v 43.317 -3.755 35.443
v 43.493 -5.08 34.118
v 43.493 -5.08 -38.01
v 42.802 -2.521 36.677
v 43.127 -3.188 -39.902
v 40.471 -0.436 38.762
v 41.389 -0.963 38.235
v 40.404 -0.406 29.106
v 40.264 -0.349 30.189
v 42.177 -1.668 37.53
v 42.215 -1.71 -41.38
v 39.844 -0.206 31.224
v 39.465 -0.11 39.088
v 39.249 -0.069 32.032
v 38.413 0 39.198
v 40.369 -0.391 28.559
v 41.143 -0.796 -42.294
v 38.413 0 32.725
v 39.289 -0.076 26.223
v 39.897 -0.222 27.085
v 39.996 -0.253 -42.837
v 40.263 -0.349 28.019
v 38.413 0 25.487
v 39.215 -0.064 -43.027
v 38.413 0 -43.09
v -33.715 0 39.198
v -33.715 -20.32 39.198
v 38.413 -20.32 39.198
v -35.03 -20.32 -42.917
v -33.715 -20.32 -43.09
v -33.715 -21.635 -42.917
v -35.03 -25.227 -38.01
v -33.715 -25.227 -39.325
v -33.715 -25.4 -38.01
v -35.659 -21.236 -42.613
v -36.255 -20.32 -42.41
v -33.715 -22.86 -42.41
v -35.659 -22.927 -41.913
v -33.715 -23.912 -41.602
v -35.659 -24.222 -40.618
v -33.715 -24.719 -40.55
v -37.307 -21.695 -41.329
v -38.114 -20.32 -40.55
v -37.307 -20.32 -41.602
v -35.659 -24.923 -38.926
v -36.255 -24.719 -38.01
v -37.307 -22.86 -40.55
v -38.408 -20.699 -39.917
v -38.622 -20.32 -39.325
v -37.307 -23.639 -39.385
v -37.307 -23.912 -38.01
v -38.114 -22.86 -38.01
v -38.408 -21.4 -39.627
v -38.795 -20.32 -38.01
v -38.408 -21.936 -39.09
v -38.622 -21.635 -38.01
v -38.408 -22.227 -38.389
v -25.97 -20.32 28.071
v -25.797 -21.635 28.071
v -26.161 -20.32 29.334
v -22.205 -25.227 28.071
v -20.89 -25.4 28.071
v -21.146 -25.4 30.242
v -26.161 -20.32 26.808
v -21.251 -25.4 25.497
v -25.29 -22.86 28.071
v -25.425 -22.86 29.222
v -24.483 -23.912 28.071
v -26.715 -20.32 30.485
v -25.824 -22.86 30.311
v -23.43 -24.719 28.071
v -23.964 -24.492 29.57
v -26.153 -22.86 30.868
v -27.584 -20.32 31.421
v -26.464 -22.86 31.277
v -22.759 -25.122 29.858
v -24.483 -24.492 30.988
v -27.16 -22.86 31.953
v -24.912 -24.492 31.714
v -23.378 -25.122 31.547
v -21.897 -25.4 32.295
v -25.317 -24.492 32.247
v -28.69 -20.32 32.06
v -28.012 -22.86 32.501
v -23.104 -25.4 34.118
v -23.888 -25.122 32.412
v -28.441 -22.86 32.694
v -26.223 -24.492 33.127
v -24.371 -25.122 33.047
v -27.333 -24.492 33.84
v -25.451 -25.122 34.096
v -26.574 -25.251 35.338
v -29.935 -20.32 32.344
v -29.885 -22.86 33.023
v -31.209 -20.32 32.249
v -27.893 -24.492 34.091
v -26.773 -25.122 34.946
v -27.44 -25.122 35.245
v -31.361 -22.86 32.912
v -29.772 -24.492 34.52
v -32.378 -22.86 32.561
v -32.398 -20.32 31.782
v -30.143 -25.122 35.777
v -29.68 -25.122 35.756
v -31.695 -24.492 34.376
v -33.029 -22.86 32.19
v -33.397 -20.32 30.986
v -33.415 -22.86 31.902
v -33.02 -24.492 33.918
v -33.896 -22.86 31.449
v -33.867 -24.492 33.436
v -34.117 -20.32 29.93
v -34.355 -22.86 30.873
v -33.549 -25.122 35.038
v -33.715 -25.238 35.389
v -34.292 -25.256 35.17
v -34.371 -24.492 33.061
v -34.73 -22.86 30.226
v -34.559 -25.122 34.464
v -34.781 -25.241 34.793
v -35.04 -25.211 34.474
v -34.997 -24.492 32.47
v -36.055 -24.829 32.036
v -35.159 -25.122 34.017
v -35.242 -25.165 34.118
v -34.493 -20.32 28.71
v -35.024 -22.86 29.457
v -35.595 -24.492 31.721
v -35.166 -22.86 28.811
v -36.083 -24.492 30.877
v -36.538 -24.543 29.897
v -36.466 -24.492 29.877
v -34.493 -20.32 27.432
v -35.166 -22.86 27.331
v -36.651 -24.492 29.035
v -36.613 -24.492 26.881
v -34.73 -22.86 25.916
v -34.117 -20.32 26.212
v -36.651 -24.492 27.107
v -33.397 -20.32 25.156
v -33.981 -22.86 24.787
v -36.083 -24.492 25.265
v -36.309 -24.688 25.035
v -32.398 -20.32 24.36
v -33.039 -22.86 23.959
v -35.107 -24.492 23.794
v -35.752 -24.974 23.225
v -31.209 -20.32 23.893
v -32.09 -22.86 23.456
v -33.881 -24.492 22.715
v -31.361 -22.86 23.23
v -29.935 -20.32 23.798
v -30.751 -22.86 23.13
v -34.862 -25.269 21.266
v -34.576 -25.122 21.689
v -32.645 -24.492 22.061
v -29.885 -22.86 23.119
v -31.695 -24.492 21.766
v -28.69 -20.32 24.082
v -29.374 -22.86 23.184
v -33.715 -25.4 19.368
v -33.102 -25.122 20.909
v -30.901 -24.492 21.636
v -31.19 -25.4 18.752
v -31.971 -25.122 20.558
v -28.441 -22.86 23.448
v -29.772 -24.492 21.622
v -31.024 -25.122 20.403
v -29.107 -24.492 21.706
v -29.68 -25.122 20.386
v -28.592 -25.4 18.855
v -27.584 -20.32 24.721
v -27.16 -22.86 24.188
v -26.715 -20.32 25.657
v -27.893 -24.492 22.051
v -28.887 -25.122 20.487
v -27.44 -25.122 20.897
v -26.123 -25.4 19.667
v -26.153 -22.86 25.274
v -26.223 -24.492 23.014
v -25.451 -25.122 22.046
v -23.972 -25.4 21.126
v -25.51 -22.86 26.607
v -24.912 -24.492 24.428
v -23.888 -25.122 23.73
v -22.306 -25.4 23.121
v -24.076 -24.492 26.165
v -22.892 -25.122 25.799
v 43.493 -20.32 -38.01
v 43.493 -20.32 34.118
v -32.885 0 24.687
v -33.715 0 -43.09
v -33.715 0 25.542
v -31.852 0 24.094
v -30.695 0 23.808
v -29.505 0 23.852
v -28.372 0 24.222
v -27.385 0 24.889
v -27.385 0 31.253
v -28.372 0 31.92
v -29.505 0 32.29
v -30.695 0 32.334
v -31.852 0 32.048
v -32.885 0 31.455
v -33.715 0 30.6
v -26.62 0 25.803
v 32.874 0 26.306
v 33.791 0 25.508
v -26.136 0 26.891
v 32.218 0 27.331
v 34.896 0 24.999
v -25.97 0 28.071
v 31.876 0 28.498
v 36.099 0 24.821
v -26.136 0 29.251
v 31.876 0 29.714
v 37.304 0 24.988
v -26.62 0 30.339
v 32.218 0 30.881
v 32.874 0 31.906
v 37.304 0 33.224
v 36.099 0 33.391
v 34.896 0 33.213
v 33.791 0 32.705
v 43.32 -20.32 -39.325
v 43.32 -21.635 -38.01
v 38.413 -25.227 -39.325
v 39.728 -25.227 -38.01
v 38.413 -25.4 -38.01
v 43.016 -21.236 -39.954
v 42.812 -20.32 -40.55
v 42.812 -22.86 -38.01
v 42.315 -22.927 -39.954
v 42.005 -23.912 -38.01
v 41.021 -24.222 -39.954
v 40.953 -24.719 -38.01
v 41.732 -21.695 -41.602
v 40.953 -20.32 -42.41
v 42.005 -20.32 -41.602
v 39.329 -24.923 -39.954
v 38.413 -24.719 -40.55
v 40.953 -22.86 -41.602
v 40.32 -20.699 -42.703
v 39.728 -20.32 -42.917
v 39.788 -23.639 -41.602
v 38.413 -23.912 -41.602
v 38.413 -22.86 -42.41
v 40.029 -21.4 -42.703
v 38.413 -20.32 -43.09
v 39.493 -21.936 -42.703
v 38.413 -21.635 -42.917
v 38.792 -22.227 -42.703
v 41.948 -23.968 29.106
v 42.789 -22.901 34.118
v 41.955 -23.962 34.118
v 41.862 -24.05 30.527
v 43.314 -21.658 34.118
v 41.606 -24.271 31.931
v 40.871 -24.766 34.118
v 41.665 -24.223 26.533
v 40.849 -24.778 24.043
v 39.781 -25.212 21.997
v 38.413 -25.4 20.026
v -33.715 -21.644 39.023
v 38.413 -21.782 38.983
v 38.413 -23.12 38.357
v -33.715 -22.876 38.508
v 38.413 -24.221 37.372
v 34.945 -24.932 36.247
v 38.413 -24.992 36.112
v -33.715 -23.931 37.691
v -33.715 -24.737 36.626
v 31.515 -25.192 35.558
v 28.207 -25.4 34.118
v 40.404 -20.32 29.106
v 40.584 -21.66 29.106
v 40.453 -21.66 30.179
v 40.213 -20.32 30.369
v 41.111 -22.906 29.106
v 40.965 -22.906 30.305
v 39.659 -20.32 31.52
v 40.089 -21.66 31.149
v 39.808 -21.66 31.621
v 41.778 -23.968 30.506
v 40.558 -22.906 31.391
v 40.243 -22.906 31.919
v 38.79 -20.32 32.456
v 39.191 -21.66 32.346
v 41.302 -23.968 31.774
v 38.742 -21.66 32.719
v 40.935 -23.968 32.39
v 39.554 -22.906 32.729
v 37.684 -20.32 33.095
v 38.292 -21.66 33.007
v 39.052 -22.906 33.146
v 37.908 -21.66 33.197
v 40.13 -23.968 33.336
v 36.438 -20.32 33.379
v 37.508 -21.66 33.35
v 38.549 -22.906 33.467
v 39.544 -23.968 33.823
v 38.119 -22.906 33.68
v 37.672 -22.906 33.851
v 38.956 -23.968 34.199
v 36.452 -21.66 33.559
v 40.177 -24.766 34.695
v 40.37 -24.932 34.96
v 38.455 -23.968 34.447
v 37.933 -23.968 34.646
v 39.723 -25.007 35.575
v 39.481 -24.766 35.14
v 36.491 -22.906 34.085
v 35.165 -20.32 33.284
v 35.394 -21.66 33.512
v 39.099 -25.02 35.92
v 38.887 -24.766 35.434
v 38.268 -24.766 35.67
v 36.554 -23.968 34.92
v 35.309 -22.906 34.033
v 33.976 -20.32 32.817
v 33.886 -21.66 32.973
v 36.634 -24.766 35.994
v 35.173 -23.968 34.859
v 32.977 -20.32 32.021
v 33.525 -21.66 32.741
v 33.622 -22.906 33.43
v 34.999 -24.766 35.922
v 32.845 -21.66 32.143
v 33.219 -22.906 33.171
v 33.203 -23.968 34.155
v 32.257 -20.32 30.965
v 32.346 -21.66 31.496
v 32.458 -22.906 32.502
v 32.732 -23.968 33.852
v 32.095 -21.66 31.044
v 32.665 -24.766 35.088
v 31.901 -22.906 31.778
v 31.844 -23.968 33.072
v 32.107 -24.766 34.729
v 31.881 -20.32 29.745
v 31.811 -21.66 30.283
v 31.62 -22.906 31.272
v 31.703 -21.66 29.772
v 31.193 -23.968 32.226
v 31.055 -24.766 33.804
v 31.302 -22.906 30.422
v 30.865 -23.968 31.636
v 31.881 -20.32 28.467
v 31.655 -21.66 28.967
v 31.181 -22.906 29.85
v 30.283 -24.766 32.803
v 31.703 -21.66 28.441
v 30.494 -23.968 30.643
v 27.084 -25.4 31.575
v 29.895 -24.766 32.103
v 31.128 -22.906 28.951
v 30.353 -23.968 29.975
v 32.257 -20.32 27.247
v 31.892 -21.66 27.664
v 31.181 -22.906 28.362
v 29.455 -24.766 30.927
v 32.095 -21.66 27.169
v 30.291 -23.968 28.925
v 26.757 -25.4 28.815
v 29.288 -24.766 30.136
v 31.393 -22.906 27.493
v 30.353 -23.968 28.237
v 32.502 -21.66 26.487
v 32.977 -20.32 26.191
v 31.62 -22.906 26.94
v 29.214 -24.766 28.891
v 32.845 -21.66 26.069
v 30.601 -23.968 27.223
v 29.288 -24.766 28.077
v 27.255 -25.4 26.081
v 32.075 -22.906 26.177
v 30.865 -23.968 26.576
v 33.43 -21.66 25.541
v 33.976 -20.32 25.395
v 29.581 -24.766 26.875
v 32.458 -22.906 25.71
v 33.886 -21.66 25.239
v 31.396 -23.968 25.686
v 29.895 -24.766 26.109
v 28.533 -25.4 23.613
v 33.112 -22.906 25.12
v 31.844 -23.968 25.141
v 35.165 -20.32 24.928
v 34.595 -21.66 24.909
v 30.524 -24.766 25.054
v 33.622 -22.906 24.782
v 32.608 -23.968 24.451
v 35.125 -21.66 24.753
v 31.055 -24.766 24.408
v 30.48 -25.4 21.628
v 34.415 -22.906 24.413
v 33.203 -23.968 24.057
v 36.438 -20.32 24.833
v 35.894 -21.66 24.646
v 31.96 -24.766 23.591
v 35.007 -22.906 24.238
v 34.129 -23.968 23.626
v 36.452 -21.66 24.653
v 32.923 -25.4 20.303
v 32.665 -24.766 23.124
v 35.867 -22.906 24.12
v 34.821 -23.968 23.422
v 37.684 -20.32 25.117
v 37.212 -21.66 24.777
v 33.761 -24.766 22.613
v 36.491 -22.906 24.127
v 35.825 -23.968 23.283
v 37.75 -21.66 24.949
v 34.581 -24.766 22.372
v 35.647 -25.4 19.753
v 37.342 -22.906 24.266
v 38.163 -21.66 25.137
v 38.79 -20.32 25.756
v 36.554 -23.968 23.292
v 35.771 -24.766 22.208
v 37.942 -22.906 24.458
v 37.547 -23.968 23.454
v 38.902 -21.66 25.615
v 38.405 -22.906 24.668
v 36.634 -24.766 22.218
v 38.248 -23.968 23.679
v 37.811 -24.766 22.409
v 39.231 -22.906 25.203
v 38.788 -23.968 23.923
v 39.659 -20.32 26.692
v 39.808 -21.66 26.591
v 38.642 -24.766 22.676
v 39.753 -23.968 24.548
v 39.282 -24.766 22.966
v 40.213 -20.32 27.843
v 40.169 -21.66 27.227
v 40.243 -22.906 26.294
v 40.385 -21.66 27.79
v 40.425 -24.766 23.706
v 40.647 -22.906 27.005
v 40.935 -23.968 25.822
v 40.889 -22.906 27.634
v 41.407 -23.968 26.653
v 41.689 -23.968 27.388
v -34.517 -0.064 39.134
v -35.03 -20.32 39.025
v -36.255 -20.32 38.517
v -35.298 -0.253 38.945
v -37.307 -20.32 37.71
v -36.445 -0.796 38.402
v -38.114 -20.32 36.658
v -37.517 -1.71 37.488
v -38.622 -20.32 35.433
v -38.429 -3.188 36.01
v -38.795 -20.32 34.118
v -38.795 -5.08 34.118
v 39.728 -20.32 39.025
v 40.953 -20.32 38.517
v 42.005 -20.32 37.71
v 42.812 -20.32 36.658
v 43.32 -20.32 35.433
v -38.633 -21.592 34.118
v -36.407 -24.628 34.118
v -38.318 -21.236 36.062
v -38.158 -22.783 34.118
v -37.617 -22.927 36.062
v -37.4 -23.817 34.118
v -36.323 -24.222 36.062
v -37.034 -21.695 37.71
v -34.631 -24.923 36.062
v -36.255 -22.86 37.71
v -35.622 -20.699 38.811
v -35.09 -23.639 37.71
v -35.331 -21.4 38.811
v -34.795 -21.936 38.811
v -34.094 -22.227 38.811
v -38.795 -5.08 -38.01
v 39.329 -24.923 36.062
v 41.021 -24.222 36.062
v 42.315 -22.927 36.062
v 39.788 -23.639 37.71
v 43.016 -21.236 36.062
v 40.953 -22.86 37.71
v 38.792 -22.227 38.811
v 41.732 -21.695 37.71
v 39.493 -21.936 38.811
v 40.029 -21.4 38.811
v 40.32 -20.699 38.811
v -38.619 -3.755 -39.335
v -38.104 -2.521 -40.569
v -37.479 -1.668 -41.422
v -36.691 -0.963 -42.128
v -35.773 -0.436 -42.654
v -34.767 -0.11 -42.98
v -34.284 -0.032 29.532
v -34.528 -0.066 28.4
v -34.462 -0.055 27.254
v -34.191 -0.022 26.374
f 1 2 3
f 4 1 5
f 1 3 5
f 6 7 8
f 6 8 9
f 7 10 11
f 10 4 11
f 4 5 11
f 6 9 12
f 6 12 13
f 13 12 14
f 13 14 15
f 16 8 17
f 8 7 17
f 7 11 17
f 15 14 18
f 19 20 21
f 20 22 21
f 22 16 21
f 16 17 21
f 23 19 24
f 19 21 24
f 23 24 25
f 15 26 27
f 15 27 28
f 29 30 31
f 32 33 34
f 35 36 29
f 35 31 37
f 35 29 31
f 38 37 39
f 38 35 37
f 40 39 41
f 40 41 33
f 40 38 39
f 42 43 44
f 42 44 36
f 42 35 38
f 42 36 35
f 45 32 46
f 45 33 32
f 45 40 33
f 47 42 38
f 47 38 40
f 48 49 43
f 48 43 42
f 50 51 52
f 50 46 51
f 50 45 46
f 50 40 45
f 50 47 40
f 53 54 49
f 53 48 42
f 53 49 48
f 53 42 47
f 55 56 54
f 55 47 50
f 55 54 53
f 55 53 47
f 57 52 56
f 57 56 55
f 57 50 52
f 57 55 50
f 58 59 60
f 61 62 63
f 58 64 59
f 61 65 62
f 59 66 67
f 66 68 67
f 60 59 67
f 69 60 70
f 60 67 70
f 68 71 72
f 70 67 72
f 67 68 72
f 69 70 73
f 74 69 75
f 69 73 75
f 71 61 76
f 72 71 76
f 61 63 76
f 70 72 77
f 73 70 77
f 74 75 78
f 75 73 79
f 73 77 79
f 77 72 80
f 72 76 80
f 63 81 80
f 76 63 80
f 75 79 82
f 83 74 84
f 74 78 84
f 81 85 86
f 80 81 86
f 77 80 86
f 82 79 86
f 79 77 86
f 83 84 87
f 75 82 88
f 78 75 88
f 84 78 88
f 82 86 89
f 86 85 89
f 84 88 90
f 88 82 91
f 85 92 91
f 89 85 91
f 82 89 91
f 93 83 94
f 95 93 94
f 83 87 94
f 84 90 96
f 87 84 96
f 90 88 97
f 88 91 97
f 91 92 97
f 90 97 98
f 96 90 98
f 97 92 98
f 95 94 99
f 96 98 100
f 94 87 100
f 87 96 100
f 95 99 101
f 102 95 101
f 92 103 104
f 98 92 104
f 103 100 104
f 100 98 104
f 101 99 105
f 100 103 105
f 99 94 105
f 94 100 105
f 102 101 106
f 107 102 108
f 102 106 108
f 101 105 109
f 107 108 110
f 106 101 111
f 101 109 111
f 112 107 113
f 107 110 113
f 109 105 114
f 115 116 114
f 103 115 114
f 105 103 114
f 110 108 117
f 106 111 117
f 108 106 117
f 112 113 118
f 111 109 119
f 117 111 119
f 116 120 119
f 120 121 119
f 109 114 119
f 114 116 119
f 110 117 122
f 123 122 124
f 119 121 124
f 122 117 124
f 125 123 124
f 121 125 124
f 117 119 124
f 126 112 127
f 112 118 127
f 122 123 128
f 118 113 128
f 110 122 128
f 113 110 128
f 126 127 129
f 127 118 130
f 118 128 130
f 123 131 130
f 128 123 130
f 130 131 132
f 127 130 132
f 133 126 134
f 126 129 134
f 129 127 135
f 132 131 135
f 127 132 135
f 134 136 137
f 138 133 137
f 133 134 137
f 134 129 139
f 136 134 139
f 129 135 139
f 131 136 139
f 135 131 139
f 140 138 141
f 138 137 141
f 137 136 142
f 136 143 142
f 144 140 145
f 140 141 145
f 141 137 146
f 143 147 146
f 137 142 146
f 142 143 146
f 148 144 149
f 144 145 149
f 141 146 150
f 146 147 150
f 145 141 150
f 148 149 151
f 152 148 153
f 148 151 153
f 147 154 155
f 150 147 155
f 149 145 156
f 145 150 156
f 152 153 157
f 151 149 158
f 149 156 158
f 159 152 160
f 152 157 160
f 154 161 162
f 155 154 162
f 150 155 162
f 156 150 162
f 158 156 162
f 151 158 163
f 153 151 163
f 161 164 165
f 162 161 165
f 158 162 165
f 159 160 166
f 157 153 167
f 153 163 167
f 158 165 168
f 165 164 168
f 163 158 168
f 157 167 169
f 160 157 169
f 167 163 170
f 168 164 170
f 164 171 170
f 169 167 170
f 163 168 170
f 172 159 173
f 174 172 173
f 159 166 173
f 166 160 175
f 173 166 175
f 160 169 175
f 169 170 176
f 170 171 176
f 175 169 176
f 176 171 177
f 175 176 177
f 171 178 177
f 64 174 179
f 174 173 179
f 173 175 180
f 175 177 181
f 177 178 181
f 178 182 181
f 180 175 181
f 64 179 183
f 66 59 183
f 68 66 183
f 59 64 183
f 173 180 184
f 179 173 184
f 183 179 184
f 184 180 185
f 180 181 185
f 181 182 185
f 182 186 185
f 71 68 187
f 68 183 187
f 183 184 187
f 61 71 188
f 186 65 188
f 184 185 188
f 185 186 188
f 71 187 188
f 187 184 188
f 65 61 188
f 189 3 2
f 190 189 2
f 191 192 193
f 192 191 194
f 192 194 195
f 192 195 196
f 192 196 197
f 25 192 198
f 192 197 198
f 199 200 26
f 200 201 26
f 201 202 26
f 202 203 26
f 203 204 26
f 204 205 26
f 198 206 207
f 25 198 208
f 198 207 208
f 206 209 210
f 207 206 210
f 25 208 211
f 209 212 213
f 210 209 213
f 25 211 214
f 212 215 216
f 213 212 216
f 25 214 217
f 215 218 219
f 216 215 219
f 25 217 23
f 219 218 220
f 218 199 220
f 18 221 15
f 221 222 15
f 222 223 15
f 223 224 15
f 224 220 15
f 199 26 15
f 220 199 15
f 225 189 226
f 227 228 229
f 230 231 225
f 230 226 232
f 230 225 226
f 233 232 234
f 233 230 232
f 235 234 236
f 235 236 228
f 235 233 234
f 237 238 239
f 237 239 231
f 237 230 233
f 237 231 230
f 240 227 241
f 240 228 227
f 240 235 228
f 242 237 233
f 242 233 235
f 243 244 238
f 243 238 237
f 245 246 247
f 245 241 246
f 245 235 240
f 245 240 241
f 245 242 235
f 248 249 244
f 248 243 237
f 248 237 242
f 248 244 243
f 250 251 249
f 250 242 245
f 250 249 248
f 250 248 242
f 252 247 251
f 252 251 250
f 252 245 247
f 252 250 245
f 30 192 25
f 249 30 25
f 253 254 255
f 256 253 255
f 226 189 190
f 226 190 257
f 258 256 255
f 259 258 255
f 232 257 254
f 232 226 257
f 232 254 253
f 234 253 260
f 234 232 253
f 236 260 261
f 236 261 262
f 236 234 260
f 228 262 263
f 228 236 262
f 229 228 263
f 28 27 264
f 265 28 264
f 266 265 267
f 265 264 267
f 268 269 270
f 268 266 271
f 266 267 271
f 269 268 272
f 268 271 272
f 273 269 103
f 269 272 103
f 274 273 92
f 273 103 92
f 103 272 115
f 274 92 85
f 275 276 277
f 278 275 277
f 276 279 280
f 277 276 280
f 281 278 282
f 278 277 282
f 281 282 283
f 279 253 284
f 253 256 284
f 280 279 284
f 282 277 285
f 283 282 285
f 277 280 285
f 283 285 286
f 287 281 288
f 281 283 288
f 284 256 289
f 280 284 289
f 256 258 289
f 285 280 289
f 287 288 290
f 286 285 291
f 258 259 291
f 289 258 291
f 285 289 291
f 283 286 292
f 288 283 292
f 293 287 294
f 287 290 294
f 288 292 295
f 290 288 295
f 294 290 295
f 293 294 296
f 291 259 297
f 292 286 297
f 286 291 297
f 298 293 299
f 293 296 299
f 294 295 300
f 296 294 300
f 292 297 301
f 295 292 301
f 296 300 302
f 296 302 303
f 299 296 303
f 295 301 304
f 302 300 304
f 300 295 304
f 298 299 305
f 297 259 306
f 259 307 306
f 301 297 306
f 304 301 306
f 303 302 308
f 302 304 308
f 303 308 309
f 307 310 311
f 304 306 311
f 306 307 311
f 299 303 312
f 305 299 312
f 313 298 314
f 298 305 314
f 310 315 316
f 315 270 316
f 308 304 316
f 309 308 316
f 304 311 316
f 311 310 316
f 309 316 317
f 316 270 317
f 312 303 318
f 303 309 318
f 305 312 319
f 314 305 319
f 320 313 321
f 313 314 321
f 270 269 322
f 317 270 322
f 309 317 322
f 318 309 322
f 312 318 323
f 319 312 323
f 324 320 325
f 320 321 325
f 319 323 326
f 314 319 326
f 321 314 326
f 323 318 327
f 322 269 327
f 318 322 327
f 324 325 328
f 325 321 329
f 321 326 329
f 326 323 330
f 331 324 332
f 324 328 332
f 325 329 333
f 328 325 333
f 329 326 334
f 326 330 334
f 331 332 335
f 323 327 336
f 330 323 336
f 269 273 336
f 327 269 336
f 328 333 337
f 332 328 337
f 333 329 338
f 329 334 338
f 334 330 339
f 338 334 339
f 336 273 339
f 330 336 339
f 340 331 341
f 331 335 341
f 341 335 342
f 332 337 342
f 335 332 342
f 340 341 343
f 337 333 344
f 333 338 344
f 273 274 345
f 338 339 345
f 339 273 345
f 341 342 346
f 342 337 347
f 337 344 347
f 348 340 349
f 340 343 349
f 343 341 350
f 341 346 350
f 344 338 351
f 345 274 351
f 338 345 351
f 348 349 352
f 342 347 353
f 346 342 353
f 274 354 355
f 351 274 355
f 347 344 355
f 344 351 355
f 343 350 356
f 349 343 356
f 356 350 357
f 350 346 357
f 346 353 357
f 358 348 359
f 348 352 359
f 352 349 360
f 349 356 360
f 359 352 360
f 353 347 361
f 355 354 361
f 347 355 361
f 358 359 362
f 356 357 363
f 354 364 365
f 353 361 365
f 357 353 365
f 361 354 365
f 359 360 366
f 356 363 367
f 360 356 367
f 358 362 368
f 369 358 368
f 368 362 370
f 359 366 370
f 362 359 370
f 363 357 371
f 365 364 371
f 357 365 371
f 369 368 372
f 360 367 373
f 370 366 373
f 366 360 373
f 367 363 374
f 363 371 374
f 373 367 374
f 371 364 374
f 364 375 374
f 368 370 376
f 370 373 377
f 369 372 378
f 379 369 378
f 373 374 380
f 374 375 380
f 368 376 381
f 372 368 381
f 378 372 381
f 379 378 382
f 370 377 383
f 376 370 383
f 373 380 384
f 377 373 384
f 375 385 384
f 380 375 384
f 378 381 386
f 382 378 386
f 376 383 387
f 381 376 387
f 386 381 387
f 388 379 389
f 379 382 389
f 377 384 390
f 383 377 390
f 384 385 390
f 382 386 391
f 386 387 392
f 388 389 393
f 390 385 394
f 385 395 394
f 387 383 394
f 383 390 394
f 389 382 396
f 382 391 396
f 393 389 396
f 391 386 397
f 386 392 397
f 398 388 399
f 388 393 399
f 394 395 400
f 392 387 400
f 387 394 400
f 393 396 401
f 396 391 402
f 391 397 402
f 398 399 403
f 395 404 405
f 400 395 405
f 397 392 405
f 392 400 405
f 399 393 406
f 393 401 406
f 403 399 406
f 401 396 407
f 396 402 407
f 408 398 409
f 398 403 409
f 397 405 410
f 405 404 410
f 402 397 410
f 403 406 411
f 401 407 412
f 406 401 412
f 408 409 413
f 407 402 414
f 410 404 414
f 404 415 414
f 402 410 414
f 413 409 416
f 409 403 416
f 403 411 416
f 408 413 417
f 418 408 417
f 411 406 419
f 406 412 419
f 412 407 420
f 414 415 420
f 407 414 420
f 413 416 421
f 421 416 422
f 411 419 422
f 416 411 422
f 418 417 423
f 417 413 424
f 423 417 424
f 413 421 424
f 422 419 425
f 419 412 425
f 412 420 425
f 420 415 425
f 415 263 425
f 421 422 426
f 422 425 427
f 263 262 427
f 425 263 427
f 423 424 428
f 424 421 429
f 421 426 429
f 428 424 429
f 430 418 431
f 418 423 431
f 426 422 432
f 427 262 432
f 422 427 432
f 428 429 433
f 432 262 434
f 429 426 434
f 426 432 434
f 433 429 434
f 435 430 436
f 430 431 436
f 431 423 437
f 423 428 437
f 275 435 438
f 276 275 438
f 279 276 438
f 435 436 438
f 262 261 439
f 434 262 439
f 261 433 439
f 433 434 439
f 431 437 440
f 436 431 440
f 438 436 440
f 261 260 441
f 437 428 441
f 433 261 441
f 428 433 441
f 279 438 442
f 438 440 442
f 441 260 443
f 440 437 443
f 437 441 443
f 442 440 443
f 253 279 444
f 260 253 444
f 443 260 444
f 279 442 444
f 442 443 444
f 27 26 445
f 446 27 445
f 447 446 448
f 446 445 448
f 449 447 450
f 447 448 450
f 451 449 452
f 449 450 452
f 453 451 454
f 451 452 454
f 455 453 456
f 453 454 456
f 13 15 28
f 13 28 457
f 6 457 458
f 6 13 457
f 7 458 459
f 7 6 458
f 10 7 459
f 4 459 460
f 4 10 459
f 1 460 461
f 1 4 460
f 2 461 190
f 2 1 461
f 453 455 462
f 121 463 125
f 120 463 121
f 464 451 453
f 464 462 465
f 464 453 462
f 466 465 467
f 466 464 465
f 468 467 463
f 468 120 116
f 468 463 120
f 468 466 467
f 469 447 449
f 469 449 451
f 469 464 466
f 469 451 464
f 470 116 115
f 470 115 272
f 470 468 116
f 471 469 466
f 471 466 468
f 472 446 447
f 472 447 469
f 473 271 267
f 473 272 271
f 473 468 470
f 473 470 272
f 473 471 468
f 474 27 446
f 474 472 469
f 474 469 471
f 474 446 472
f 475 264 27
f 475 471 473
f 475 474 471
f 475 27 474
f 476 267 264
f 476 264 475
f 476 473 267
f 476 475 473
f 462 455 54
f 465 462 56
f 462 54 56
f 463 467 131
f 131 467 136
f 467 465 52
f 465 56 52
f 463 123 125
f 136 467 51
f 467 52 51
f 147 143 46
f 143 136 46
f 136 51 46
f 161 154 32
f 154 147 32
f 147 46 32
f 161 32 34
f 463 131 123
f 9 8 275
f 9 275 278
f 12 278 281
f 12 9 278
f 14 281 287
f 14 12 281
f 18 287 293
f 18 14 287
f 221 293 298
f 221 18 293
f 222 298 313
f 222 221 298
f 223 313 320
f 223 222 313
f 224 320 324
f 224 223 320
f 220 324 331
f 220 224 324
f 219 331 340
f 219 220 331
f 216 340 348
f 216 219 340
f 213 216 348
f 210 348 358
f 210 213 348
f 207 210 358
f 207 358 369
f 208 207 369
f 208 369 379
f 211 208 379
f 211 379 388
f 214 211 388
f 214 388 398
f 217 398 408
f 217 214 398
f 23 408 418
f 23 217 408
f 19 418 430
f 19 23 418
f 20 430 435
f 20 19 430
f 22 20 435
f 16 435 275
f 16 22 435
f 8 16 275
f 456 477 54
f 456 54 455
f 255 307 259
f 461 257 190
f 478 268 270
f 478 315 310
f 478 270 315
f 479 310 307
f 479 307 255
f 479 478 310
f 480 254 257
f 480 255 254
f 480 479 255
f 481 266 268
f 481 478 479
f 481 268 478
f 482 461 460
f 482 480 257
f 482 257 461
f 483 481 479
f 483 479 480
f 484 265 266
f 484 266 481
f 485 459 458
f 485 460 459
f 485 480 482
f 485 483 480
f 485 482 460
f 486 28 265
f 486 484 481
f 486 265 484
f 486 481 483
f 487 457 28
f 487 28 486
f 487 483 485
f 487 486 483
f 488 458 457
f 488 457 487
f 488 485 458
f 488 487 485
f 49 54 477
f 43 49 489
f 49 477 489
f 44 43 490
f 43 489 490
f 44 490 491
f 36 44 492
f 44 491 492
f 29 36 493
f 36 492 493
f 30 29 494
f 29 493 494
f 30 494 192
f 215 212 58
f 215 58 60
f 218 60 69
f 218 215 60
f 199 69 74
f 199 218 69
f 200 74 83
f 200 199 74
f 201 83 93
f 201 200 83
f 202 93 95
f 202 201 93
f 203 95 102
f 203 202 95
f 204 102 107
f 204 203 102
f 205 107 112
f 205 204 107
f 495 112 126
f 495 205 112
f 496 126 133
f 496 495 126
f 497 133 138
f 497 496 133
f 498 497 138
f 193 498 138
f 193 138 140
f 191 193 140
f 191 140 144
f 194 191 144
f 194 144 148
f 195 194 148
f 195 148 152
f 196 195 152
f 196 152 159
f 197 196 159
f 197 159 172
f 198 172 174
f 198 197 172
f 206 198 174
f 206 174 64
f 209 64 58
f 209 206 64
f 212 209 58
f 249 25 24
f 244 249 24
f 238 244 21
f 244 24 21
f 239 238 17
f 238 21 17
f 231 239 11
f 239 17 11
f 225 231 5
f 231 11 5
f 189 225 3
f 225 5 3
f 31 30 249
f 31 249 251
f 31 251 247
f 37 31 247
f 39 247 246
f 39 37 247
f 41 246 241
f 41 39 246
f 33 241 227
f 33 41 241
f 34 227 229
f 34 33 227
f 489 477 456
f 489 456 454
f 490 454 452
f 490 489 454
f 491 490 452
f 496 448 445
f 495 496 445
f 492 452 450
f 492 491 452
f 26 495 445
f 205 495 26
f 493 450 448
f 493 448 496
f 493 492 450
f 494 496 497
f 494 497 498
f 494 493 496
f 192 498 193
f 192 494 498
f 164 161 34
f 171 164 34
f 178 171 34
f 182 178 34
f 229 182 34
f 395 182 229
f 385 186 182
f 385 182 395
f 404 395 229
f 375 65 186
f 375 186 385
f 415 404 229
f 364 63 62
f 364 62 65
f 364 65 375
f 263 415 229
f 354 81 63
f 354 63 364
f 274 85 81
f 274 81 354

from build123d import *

# Parameters (mm, degrees)
F0_W         = 82.2881497443
F0_H         = 82.288146019
F0_R         = 4.2853217598
F1_DEPTH     = 25.4
F2_T1_DEPTH  = 33.02
F2_T3_DEPTH  = 107.688146019
F2_T5_DEPTH  = 72.128146019
F2_T7_DEPTH  = 72.1281497443
F2_S11_W     = 5.08
F2_S11_H     = 5.08
F2_T12_DEPTH = 5.08
F2_S17_W     = 5.08
F2_S17_H     = 5.08
F2_T18_DEPTH = 5.08
F2_S23_W     = 5.08
F2_S23_H     = 5.08
F2_T24_DEPTH = 5.08
F2_S29_W     = 5.08
F2_S29_H     = 5.08
F2_T30_DEPTH = 5.08


# Not quite as in the source:
# - a fillet or chamfer that OpenCascade refuses, or shapes differently, is made with other operations: its cross-section is extruded or revolved along the edge and cut away or added
# - a feature of the source that left no trace in its solid (it failed there, or was rolled back) is left out


with BuildPart() as f1:
    # F0 (on Front) → F1 (new body)
    with BuildSketch(Plane.XZ):
        with Locations((2.3490097374, -1.9460879266)):
            Rectangle(F0_W, F0_H)
        with Locations((-30.2557293326, 28.0709732324)):
            Circle(F0_R, mode=Mode.SUBTRACT)
        with Locations((36.1182056367, 29.1060488671)):
            Circle(F0_R, mode=Mode.SUBTRACT)
    extrude(amount=F1_DEPTH)

    # F2: fillet of radius 5.08 on 12 edges, made by hand

    # F2_s2 → F2_t1 (cut)
    with BuildSketch(Plane.XZ.offset(-12.7)):
        with BuildLine():
            ThreePointArc((38.4130846095, -43.0901609361), (42.0051870579, -41.6022633845), (43.4930846095, -38.0101609361))
            Line((43.4930846095, -38.0101609361), (43.4930846095, -43.0901609361))
            Line((43.4930846095, -43.0901609361), (38.4130846095, -43.0901609361))
        make_face()
        with BuildLine():
            ThreePointArc((38.4130846095, 39.1979850829), (42.0051870579, 37.7100875313), (43.4930846095, 34.1179850829))
            Line((43.4930846095, 34.1179850829), (43.4930846095, 39.1979850829))
            Line((43.4930846095, 39.1979850829), (38.4130846095, 39.1979850829))
        make_face()
        with BuildLine():
            ThreePointArc((-33.7150651348, 39.1979850829), (-37.3071675832, 37.7100875313), (-38.7950651348, 34.1179850829))
            Line((-38.7950651348, 34.1179850829), (-38.7950651348, 39.1979850829))
            Line((-38.7950651348, 39.1979850829), (-33.7150651348, 39.1979850829))
        make_face()
        with BuildLine():
            ThreePointArc((-38.7950651348, -38.0101609361), (-37.3071675832, -41.6022633845), (-33.7150651348, -43.0901609361))
            Line((-33.7150651348, -43.0901609361), (-38.7950651348, -43.0901609361))
            Line((-38.7950651348, -43.0901609361), (-38.7950651348, -38.0101609361))
        make_face()
    extrude(amount=F2_T1_DEPTH, mode=Mode.SUBTRACT)

    # F2_s4 → F2_t3 (cut)
    with BuildSketch(Plane.XY.offset(-55.7901609361)):
        with BuildLine():
            ThreePointArc((43.4930846095, -5.08), (42.0051870579, -1.4878975516), (38.4130846095, 0))
            Line((38.4130846095, 0), (43.4930846095, 0))
            Line((43.4930846095, 0), (43.4930846095, -5.08))
        make_face()
        with BuildLine():
            ThreePointArc((-38.7950651348, -5.08), (-37.3071675832, -1.4878975516), (-33.7150651348, 0))
            Line((-33.7150651348, 0), (-38.7950651348, 0))
            Line((-38.7950651348, 0), (-38.7950651348, -5.08))
        make_face()
    extrude(amount=F2_T3_DEPTH, mode=Mode.SUBTRACT)

    # F2_s6 → F2_t5 (cut)
    with BuildSketch(Plane.XY.offset(-38.0101609361)):
        with BuildLine():
            ThreePointArc((43.4930846095, -20.32), (42.0051870579, -23.9121024484), (38.4130846095, -25.4))
            Line((38.4130846095, -25.4), (43.4930846095, -25.4))
            Line((43.4930846095, -25.4), (43.4930846095, -20.32))
        make_face()
        with BuildLine():
            ThreePointArc((-38.7950651348, -20.32), (-37.3071675832, -23.9121024484), (-33.7150651348, -25.4))
            Line((-33.7150651348, -25.4), (-38.7950651348, -25.4))
            Line((-38.7950651348, -25.4), (-38.7950651348, -20.32))
        make_face()
    extrude(amount=F2_T5_DEPTH, mode=Mode.SUBTRACT)

    # F2_s8 → F2_t7 (cut)
    with BuildSketch(Plane.YZ.offset(-33.7150651348)):
        with BuildLine():
            ThreePointArc((-20.32, 39.1979850829), (-23.9121024484, 37.7100875313), (-25.4, 34.1179850829))
            Line((-25.4, 34.1179850829), (-25.4, 39.1979850829))
            Line((-25.4, 39.1979850829), (-20.32, 39.1979850829))
        make_face()
        with BuildLine():
            ThreePointArc((-20.32, -43.0901609361), (-23.9121024484, -41.6022633845), (-25.4, -38.0101609361))
            Line((-25.4, -38.0101609361), (-25.4, -43.0901609361))
            Line((-25.4, -43.0901609361), (-20.32, -43.0901609361))
        make_face()
    extrude(amount=F2_T7_DEPTH, mode=Mode.SUBTRACT)


with BuildPart() as f2_tool10:
    # F2_s11 → F2_t12 (new body)
    with BuildSketch(Plane.XY.offset(-38.0101609361)):
        with Locations((40.9530846095, -22.86)):
            Rectangle(F2_S11_W, F2_S11_H)
    extrude(amount=-F2_T12_DEPTH)

    # F2_s13 → F2_t14 (revolve, cut)
    with BuildSketch(Plane(origin=(38.4130846095, -20.32, -38.0101609361), x_dir=(-0.7071067812, 0.7071067812, 0), z_dir=(-0.7071067812, -0.7071067812, 0))):
        with BuildLine():
            ThreePointArc((0, -5.08), (5.08, 0), (0, 5.08))
            Line((0, 5.08), (0, -5.08))
        make_face()
    revolve(axis=Axis((38.4130846095, -20.32, -38.0101609361), (0, 0, -1)), mode=Mode.SUBTRACT)


with BuildPart() as f1_1:
    add(f1.part)

    # F2_t9: cut F2_tool10
    add(f2_tool10.part, mode=Mode.SUBTRACT)


with BuildPart() as f2_tool16:
    # F2_s17 → F2_t18 (new body)
    with BuildSketch(Plane.XY.offset(34.1179850829)):
        with Locations((40.9530846095, -22.86)):
            Rectangle(F2_S17_W, F2_S17_H)
    extrude(amount=F2_T18_DEPTH)

    # F2_s19 → F2_t20 (revolve, cut)
    with BuildSketch(Plane(origin=(38.4130846095, -20.32, 34.1179850829), x_dir=(-0.7071067812, 0.7071067812, 0), z_dir=(0.7071067812, 0.7071067812, 0))):
        with BuildLine():
            ThreePointArc((0, -5.08), (5.08, 0), (0, 5.08))
            Line((0, 5.08), (0, -5.08))
        make_face()
    revolve(axis=Axis((38.4130846095, -20.32, 34.1179850829), (0, 0, 1)), mode=Mode.SUBTRACT)


with BuildPart() as f1_2:
    add(f1_1.part)

    # F2_t15: cut F2_tool16
    add(f2_tool16.part, mode=Mode.SUBTRACT)


with BuildPart() as f2_tool22:
    # F2_s23 → F2_t24 (new body)
    with BuildSketch(Plane.XY.offset(34.1179850829)):
        with Locations((-36.2550651348, -22.86)):
            Rectangle(F2_S23_W, F2_S23_H)
    extrude(amount=F2_T24_DEPTH)

    # F2_s25 → F2_t26 (revolve, cut)
    with BuildSketch(Plane(origin=(-33.7150651348, -20.32, 34.1179850829), x_dir=(0.7071067812, 0.7071067812, 0), z_dir=(0.7071067812, -0.7071067812, 0))):
        with BuildLine():
            ThreePointArc((0, -5.08), (5.08, 0), (0, 5.08))
            Line((0, 5.08), (0, -5.08))
        make_face()
    revolve(axis=Axis((-33.7150651348, -20.32, 34.1179850829), (0, 0, 1)), mode=Mode.SUBTRACT)


with BuildPart() as f1_3:
    add(f1_2.part)

    # F2_t21: cut F2_tool22
    add(f2_tool22.part, mode=Mode.SUBTRACT)


with BuildPart() as f2_tool28:
    # F2_s29 → F2_t30 (new body)
    with BuildSketch(Plane.YZ.offset(-33.7150651348)):
        with Locations((-22.86, -40.5501609361)):
            Rectangle(F2_S29_W, F2_S29_H)
    extrude(amount=-F2_T30_DEPTH)

    # F2_s31 → F2_t32 (revolve, cut)
    with BuildSketch(Plane(origin=(-33.7150651348, -20.32, -38.0101609361), x_dir=(0, 0.7071067812, 0.7071067812), z_dir=(0, -0.7071067812, 0.7071067812))):
        with BuildLine():
            ThreePointArc((0, -5.08), (5.08, 0), (0, 5.08))
            Line((0, 5.08), (0, -5.08))
        make_face()
    revolve(axis=Axis((-33.7150651348, -20.32, -38.0101609361), (-1, 0, 0)), mode=Mode.SUBTRACT)


with BuildPart() as f1_4:
    add(f1_3.part)

    # F2_t27: cut F2_tool28
    add(f2_tool28.part, mode=Mode.SUBTRACT)

    # F2_s33 → F2_t34 (revolve, cut)
    with BuildSketch(Plane.XY.offset(28.0709732324)):
        with BuildLine():
            ThreePointArc((-25.9704075728, -20.32), (-24.4825100212, -23.9121024484), (-20.8904075728, -25.4))
            Line((-20.8904075728, -25.4), (-25.9704075728, -25.4))
            Line((-25.9704075728, -25.4), (-25.9704075728, -20.32))
        make_face()
    revolve(axis=Axis((-30.2557293326, -25.4, 28.0709732324), (0, -1, 0)), mode=Mode.SUBTRACT)

    # F2_s35 → F2_t36 (revolve, cut)
    with BuildSketch(Plane.XY.offset(29.1060488671)):
        with BuildLine():
            ThreePointArc((40.4035273965, -20.32), (41.8914249481, -23.9121024484), (45.4835273965, -25.4))
            Line((45.4835273965, -25.4), (40.4035273965, -25.4))
            Line((40.4035273965, -25.4), (40.4035273965, -20.32))
        make_face()
    revolve(axis=Axis((36.1182056367, -25.4, 29.1060488671), (0, -1, 0)), mode=Mode.SUBTRACT)


solid = f1_4.part
